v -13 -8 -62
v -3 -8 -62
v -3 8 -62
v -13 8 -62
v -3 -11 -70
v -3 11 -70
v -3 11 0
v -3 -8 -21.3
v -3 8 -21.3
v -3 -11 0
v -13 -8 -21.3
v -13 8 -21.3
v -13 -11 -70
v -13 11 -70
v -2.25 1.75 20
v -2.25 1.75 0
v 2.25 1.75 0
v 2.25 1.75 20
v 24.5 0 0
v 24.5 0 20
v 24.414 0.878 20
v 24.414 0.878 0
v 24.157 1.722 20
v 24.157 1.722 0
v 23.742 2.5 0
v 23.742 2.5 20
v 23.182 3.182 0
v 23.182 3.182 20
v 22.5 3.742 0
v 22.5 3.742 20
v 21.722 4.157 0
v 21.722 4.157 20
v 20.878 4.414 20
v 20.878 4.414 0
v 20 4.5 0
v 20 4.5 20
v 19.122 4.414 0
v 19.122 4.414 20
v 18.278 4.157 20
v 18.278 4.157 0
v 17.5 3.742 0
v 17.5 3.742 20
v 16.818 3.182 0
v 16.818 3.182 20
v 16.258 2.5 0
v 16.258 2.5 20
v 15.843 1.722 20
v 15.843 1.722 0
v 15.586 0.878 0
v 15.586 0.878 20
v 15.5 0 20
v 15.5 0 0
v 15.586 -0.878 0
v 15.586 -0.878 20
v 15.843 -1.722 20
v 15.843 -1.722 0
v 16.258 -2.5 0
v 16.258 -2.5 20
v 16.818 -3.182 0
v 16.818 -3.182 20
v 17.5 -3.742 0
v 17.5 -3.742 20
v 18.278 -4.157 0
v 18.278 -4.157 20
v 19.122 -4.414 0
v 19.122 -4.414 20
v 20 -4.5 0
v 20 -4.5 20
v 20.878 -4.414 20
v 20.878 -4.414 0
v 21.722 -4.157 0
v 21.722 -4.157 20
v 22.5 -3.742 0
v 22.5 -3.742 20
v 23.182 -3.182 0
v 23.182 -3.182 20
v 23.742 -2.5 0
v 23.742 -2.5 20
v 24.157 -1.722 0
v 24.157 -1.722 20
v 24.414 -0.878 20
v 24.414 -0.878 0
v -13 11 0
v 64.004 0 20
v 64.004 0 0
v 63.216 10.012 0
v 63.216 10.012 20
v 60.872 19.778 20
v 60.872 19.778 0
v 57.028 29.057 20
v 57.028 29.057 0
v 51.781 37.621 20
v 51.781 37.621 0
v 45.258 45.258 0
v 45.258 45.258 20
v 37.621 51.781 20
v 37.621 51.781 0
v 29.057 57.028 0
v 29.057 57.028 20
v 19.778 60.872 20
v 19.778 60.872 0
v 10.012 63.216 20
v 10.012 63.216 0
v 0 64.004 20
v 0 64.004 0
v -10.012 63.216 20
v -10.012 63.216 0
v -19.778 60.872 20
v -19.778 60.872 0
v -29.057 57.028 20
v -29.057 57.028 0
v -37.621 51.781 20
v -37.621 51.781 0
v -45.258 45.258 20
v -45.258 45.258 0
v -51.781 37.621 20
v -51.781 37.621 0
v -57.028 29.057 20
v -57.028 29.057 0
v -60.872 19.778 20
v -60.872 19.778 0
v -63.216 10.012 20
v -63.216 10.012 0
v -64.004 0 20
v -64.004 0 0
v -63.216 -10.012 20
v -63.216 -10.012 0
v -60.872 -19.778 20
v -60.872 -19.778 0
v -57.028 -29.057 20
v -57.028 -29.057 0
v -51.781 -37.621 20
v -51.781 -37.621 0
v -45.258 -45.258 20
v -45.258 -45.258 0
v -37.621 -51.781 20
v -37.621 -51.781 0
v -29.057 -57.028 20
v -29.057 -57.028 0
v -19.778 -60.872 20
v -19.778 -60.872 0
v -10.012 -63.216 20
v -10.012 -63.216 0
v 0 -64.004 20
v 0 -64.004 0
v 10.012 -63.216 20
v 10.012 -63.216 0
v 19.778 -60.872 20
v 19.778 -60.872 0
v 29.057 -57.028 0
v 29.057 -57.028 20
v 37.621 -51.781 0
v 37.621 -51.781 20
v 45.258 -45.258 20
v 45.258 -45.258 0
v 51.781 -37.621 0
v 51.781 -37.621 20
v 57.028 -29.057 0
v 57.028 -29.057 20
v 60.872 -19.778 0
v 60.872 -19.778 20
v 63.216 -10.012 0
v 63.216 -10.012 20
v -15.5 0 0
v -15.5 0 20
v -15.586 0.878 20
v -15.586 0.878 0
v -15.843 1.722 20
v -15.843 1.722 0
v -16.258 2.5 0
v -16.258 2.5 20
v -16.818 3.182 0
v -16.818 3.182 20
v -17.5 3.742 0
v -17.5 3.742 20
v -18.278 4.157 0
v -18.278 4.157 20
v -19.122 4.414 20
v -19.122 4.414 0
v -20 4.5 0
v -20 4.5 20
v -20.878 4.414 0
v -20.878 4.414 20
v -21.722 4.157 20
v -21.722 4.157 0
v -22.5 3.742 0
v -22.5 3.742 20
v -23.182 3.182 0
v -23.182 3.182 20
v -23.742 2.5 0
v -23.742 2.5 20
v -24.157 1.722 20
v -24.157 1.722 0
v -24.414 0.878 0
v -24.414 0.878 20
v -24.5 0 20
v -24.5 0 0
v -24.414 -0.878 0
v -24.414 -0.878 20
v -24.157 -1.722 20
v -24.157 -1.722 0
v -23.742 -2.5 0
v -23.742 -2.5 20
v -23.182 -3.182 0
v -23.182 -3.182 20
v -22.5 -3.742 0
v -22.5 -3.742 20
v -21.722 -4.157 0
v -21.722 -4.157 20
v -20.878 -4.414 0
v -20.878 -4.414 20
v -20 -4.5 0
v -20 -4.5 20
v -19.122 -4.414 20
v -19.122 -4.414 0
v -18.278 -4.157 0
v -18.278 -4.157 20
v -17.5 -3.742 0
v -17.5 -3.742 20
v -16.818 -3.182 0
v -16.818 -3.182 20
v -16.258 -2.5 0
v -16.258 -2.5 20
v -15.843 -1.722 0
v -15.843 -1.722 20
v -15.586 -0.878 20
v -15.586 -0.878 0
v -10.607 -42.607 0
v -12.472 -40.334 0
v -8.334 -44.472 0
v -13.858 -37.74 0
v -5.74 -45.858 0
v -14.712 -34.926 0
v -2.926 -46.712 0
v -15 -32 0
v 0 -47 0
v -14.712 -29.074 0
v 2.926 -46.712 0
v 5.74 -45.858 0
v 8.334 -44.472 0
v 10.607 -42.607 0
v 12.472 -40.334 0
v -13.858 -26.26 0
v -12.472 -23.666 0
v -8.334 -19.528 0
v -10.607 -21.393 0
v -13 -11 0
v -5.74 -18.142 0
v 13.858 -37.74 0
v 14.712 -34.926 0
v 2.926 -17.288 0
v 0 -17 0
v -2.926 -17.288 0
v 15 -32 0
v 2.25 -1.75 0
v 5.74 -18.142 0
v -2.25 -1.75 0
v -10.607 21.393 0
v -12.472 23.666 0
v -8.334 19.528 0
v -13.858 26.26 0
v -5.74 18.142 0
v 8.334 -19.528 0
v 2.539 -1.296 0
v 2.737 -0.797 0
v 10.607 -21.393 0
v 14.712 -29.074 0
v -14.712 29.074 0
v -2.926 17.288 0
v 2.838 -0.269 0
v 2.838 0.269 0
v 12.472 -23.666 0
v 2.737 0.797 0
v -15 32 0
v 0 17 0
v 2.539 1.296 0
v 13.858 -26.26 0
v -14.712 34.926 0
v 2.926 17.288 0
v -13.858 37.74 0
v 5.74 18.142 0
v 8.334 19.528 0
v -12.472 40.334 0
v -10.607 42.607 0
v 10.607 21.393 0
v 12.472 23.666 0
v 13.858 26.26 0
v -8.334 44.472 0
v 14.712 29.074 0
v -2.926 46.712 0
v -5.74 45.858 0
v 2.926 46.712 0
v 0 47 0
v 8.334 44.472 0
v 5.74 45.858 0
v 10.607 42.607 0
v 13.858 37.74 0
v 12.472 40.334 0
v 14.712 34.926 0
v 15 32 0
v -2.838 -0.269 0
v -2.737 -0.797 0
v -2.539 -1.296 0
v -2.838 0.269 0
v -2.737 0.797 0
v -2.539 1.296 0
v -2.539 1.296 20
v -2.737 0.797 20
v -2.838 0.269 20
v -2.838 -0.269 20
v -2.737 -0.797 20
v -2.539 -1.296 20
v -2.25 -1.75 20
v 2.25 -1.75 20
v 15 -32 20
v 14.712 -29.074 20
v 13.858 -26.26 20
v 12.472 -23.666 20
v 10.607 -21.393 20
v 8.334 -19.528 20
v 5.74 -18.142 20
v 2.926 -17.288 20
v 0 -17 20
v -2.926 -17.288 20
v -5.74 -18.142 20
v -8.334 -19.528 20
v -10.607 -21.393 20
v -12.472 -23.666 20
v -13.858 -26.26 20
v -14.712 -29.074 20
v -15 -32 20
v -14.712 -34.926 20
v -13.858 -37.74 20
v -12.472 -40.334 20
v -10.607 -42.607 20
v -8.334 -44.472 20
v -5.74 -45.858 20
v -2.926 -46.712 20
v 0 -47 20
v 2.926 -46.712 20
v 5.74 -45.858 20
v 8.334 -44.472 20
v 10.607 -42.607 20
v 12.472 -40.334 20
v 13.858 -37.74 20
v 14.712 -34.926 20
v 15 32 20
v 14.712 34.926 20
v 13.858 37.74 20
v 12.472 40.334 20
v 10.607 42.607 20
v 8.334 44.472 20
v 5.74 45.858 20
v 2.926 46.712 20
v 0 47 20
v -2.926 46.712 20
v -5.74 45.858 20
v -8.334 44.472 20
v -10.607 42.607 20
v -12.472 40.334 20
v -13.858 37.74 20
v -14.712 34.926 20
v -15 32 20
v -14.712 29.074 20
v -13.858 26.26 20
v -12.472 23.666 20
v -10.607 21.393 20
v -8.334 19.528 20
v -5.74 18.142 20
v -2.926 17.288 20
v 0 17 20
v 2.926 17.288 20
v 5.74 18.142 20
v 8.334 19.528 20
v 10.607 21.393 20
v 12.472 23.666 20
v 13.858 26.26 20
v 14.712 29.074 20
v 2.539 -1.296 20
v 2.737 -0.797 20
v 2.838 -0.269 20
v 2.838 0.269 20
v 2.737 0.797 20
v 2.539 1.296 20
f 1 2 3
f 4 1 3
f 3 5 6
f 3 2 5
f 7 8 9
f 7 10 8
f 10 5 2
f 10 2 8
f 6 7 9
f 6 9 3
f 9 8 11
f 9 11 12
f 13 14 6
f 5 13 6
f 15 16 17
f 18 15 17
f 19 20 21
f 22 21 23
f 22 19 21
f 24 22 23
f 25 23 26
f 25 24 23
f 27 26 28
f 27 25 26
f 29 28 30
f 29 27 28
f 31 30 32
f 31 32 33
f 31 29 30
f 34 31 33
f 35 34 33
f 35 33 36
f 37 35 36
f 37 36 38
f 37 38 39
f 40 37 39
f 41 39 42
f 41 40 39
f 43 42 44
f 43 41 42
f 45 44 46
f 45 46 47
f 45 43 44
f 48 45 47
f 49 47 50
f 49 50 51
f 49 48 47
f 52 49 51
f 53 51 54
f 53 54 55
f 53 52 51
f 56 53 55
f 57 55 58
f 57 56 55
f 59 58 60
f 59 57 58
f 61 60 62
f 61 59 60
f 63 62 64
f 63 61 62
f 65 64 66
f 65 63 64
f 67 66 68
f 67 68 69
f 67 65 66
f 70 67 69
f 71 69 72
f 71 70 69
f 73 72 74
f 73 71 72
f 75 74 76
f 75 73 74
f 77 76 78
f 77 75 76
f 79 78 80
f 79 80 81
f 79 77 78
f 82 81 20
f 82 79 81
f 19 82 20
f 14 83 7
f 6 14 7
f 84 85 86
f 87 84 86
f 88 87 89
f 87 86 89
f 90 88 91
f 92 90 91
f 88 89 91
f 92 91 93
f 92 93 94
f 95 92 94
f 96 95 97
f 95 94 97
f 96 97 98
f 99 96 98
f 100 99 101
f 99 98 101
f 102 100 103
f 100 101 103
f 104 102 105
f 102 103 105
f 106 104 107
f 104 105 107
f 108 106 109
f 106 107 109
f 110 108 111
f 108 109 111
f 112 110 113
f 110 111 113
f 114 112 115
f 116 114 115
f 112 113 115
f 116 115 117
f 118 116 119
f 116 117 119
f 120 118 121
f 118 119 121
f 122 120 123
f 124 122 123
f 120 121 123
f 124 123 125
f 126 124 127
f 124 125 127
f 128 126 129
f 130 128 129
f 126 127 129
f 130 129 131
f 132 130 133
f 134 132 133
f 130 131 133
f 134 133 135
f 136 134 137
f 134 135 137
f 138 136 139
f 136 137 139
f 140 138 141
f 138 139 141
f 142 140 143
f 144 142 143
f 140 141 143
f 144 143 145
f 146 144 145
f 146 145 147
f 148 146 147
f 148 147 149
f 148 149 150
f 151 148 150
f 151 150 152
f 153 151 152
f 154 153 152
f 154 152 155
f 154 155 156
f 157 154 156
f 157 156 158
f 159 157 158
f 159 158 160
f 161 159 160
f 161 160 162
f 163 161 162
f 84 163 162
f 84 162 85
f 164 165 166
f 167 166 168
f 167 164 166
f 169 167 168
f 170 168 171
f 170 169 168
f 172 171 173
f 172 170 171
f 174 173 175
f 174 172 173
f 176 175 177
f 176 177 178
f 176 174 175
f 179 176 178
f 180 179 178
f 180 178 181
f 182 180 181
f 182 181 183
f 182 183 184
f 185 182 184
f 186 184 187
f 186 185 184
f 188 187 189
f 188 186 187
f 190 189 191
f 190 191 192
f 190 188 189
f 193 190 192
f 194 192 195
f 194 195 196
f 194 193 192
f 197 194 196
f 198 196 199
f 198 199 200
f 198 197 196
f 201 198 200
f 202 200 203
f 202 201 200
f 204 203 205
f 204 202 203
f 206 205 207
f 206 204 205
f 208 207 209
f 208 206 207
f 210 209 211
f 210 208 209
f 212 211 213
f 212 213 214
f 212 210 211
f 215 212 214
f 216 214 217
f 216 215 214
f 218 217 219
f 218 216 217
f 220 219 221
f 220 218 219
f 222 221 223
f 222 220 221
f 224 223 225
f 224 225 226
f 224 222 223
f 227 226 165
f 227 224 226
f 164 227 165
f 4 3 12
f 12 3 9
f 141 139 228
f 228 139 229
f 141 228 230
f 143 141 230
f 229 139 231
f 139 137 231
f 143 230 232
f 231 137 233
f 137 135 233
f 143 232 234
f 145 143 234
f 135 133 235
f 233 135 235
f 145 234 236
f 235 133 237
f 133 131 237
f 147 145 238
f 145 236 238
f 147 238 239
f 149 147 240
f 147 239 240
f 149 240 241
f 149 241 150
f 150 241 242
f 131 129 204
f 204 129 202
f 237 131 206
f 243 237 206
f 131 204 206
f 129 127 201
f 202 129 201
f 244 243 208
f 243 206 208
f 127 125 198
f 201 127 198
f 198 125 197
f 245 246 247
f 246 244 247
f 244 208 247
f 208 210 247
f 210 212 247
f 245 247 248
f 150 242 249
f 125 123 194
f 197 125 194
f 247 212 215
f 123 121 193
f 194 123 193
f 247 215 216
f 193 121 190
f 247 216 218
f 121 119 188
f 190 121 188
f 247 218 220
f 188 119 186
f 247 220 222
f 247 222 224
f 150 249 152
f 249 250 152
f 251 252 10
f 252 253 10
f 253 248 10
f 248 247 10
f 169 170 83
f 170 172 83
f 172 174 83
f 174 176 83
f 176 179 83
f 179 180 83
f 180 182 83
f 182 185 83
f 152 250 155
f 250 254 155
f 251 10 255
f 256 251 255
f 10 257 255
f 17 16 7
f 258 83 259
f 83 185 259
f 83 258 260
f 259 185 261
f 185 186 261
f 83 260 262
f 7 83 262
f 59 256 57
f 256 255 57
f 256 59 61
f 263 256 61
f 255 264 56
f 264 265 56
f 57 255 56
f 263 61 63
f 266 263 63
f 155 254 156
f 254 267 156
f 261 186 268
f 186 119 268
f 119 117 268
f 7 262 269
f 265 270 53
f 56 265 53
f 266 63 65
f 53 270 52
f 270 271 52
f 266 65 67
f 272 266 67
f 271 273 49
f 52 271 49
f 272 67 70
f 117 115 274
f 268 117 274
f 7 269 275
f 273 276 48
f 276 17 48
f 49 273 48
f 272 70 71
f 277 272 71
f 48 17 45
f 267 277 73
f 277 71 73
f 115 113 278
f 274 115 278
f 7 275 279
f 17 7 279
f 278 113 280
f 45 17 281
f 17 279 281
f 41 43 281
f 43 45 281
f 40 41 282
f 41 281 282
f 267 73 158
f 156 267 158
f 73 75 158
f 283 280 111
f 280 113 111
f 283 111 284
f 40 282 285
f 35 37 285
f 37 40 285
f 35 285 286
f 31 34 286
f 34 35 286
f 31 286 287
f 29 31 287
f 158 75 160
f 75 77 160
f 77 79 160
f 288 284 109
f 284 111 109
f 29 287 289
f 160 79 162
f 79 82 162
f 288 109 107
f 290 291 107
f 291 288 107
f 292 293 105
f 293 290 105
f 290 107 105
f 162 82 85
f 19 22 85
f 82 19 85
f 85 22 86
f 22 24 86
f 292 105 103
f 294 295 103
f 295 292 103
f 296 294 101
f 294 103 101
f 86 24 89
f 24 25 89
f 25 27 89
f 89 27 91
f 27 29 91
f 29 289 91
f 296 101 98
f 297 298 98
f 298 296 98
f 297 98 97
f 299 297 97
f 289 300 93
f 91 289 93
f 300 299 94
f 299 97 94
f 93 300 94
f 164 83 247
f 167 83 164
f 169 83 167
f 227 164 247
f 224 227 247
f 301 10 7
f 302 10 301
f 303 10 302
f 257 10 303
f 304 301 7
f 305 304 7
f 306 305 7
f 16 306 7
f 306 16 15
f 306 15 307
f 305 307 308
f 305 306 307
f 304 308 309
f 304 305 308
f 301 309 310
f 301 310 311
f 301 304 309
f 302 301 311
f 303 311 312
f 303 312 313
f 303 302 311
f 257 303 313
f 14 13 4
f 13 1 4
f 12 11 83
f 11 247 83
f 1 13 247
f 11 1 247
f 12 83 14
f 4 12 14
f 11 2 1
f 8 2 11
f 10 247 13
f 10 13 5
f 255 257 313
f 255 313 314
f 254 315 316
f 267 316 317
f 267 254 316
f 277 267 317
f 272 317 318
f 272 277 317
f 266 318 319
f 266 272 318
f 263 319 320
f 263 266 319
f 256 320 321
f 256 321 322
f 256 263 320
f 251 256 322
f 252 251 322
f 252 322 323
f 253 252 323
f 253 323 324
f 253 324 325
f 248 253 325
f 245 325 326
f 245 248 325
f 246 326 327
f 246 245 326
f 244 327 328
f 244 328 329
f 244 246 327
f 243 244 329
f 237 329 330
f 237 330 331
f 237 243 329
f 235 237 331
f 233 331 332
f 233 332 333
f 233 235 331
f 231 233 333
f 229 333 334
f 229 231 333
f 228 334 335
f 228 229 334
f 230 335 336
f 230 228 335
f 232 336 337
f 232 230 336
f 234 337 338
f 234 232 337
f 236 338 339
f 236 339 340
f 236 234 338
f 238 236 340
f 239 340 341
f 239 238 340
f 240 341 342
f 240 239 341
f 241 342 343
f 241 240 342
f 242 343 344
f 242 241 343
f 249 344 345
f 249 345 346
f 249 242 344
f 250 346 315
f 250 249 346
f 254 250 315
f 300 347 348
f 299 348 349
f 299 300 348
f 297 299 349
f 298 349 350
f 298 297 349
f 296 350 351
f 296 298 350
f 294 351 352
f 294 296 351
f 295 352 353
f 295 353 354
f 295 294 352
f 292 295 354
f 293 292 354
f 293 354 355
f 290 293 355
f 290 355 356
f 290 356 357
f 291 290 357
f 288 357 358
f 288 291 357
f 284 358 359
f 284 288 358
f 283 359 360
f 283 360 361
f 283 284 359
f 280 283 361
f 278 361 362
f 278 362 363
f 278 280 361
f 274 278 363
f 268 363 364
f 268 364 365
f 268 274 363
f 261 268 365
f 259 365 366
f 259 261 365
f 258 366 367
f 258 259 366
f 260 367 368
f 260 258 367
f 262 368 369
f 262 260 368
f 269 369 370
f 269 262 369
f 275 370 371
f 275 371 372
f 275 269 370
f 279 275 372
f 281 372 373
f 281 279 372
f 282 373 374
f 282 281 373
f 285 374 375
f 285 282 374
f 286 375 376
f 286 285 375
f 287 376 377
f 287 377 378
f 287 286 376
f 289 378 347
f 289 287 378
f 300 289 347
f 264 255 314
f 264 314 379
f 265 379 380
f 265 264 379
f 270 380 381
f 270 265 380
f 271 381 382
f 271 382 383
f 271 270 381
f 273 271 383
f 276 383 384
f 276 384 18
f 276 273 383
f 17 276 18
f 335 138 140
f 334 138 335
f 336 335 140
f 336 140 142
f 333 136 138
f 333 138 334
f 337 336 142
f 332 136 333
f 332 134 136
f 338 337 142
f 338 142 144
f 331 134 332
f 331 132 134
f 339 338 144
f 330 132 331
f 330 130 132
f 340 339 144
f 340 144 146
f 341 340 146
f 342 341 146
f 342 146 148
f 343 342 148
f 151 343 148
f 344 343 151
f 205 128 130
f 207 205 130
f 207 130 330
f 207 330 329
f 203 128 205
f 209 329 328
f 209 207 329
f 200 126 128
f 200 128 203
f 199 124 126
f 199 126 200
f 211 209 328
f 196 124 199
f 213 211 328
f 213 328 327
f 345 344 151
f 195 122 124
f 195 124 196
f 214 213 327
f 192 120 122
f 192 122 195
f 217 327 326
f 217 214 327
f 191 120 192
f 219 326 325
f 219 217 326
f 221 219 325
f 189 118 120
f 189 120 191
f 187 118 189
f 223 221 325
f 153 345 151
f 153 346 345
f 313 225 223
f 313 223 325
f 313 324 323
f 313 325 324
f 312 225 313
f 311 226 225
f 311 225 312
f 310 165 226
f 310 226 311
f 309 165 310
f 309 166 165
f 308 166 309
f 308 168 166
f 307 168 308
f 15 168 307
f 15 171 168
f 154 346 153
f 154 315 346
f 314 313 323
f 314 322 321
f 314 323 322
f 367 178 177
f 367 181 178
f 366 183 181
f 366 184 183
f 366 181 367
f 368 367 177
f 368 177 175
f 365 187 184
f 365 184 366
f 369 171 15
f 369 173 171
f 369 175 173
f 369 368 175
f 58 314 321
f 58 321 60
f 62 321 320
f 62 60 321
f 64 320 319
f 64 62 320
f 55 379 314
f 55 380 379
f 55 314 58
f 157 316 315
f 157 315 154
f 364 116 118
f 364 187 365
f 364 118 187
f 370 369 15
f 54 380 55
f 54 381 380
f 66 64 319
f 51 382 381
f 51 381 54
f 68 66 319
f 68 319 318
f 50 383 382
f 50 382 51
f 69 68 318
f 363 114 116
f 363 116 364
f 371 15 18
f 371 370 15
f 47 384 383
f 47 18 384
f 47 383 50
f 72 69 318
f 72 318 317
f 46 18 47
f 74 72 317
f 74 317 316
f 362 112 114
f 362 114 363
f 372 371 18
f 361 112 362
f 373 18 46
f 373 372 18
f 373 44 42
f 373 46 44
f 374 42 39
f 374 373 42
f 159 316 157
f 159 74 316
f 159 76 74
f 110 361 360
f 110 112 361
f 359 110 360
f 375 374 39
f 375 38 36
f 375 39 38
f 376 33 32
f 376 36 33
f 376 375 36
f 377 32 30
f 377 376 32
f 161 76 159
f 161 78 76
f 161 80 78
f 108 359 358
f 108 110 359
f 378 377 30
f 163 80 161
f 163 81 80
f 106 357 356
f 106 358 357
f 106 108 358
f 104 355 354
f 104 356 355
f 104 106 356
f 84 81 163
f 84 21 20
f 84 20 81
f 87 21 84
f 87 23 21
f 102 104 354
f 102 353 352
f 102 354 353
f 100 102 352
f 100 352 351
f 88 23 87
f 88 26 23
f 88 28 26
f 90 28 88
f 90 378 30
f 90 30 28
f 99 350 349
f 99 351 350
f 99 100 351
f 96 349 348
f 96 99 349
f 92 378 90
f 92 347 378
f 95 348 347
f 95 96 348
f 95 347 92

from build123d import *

# Parameters (mm, degrees)
SKETCH004_R     = 64.00438
PAD_DEPTH       = 20
SKETCH006_R     = 4.5
POCKET_DEPTH    = 20
SKETCH005_R     = 4.5
POCKET001_DEPTH = 20
SKETCH007_W     = 10
SKETCH007_H     = 22
PAD001_DEPTH    = 70
SKETCH_W        = 16
SKETCH_H        = 40.7
POCKET002_DEPTH = 10
POCKET003_DEPTH = 20
SKETCH008_R     = 15
POCKET004_DEPTH = 20
SKETCH011_R     = 15
POCKET005_DEPTH = 20


with BuildPart() as part:
    # Sketch004 → Pad (new body)
    with BuildSketch(Plane.XY):
        Circle(SKETCH004_R)
    extrude(amount=PAD_DEPTH)

    # Sketch006 → Pocket (cut)
    with BuildSketch(Plane.XY):
        with Locations((20, 0)):
            Circle(SKETCH006_R)
    extrude(amount=POCKET_DEPTH, mode=Mode.SUBTRACT)

    # Sketch005 → Pocket001 (cut)
    with BuildSketch(Plane.XY):
        with Locations((-20, 0)):
            Circle(SKETCH005_R)
    extrude(amount=POCKET001_DEPTH, mode=Mode.SUBTRACT)

    # Sketch007 → Pad001 (join)
    with BuildSketch(Plane.XY):
        with Locations((-8, 0)):
            Rectangle(SKETCH007_W, SKETCH007_H)
    extrude(amount=-PAD001_DEPTH)

    # Sketch (on Face7 of Pad001) → Pocket002 (cut)
    with BuildSketch(Plane.YZ.offset(-3)):
        with Locations((0, -41.65)):
            Rectangle(SKETCH_W, SKETCH_H)
    extrude(amount=-POCKET002_DEPTH, mode=Mode.SUBTRACT)

    # Sketch001 → Pocket003 (cut)
    with BuildSketch(Plane.XY):
        with BuildLine():
            Line((-2.25, 1.75), (2.25, 1.75))
            ThreePointArc((2.25, -1.75), (2.850439, 0), (2.25, 1.75))
            Line((-2.25, -1.75), (2.25, -1.75))
            ThreePointArc((-2.25, 1.75), (-2.850439, 0), (-2.25, -1.75))
        make_face()
    extrude(amount=POCKET003_DEPTH, mode=Mode.SUBTRACT)

    # Sketch008 → Pocket004 (cut)
    with BuildSketch(Plane.XY):
        with Locations((0, 32)):
            Circle(SKETCH008_R)
    extrude(amount=POCKET004_DEPTH, mode=Mode.SUBTRACT)

    # Sketch011 → Pocket005 (cut)
    with BuildSketch(Plane.XY):
        with Locations((0, -32)):
            Circle(SKETCH011_R)
    extrude(amount=POCKET005_DEPTH, mode=Mode.SUBTRACT)


solid = part.part
